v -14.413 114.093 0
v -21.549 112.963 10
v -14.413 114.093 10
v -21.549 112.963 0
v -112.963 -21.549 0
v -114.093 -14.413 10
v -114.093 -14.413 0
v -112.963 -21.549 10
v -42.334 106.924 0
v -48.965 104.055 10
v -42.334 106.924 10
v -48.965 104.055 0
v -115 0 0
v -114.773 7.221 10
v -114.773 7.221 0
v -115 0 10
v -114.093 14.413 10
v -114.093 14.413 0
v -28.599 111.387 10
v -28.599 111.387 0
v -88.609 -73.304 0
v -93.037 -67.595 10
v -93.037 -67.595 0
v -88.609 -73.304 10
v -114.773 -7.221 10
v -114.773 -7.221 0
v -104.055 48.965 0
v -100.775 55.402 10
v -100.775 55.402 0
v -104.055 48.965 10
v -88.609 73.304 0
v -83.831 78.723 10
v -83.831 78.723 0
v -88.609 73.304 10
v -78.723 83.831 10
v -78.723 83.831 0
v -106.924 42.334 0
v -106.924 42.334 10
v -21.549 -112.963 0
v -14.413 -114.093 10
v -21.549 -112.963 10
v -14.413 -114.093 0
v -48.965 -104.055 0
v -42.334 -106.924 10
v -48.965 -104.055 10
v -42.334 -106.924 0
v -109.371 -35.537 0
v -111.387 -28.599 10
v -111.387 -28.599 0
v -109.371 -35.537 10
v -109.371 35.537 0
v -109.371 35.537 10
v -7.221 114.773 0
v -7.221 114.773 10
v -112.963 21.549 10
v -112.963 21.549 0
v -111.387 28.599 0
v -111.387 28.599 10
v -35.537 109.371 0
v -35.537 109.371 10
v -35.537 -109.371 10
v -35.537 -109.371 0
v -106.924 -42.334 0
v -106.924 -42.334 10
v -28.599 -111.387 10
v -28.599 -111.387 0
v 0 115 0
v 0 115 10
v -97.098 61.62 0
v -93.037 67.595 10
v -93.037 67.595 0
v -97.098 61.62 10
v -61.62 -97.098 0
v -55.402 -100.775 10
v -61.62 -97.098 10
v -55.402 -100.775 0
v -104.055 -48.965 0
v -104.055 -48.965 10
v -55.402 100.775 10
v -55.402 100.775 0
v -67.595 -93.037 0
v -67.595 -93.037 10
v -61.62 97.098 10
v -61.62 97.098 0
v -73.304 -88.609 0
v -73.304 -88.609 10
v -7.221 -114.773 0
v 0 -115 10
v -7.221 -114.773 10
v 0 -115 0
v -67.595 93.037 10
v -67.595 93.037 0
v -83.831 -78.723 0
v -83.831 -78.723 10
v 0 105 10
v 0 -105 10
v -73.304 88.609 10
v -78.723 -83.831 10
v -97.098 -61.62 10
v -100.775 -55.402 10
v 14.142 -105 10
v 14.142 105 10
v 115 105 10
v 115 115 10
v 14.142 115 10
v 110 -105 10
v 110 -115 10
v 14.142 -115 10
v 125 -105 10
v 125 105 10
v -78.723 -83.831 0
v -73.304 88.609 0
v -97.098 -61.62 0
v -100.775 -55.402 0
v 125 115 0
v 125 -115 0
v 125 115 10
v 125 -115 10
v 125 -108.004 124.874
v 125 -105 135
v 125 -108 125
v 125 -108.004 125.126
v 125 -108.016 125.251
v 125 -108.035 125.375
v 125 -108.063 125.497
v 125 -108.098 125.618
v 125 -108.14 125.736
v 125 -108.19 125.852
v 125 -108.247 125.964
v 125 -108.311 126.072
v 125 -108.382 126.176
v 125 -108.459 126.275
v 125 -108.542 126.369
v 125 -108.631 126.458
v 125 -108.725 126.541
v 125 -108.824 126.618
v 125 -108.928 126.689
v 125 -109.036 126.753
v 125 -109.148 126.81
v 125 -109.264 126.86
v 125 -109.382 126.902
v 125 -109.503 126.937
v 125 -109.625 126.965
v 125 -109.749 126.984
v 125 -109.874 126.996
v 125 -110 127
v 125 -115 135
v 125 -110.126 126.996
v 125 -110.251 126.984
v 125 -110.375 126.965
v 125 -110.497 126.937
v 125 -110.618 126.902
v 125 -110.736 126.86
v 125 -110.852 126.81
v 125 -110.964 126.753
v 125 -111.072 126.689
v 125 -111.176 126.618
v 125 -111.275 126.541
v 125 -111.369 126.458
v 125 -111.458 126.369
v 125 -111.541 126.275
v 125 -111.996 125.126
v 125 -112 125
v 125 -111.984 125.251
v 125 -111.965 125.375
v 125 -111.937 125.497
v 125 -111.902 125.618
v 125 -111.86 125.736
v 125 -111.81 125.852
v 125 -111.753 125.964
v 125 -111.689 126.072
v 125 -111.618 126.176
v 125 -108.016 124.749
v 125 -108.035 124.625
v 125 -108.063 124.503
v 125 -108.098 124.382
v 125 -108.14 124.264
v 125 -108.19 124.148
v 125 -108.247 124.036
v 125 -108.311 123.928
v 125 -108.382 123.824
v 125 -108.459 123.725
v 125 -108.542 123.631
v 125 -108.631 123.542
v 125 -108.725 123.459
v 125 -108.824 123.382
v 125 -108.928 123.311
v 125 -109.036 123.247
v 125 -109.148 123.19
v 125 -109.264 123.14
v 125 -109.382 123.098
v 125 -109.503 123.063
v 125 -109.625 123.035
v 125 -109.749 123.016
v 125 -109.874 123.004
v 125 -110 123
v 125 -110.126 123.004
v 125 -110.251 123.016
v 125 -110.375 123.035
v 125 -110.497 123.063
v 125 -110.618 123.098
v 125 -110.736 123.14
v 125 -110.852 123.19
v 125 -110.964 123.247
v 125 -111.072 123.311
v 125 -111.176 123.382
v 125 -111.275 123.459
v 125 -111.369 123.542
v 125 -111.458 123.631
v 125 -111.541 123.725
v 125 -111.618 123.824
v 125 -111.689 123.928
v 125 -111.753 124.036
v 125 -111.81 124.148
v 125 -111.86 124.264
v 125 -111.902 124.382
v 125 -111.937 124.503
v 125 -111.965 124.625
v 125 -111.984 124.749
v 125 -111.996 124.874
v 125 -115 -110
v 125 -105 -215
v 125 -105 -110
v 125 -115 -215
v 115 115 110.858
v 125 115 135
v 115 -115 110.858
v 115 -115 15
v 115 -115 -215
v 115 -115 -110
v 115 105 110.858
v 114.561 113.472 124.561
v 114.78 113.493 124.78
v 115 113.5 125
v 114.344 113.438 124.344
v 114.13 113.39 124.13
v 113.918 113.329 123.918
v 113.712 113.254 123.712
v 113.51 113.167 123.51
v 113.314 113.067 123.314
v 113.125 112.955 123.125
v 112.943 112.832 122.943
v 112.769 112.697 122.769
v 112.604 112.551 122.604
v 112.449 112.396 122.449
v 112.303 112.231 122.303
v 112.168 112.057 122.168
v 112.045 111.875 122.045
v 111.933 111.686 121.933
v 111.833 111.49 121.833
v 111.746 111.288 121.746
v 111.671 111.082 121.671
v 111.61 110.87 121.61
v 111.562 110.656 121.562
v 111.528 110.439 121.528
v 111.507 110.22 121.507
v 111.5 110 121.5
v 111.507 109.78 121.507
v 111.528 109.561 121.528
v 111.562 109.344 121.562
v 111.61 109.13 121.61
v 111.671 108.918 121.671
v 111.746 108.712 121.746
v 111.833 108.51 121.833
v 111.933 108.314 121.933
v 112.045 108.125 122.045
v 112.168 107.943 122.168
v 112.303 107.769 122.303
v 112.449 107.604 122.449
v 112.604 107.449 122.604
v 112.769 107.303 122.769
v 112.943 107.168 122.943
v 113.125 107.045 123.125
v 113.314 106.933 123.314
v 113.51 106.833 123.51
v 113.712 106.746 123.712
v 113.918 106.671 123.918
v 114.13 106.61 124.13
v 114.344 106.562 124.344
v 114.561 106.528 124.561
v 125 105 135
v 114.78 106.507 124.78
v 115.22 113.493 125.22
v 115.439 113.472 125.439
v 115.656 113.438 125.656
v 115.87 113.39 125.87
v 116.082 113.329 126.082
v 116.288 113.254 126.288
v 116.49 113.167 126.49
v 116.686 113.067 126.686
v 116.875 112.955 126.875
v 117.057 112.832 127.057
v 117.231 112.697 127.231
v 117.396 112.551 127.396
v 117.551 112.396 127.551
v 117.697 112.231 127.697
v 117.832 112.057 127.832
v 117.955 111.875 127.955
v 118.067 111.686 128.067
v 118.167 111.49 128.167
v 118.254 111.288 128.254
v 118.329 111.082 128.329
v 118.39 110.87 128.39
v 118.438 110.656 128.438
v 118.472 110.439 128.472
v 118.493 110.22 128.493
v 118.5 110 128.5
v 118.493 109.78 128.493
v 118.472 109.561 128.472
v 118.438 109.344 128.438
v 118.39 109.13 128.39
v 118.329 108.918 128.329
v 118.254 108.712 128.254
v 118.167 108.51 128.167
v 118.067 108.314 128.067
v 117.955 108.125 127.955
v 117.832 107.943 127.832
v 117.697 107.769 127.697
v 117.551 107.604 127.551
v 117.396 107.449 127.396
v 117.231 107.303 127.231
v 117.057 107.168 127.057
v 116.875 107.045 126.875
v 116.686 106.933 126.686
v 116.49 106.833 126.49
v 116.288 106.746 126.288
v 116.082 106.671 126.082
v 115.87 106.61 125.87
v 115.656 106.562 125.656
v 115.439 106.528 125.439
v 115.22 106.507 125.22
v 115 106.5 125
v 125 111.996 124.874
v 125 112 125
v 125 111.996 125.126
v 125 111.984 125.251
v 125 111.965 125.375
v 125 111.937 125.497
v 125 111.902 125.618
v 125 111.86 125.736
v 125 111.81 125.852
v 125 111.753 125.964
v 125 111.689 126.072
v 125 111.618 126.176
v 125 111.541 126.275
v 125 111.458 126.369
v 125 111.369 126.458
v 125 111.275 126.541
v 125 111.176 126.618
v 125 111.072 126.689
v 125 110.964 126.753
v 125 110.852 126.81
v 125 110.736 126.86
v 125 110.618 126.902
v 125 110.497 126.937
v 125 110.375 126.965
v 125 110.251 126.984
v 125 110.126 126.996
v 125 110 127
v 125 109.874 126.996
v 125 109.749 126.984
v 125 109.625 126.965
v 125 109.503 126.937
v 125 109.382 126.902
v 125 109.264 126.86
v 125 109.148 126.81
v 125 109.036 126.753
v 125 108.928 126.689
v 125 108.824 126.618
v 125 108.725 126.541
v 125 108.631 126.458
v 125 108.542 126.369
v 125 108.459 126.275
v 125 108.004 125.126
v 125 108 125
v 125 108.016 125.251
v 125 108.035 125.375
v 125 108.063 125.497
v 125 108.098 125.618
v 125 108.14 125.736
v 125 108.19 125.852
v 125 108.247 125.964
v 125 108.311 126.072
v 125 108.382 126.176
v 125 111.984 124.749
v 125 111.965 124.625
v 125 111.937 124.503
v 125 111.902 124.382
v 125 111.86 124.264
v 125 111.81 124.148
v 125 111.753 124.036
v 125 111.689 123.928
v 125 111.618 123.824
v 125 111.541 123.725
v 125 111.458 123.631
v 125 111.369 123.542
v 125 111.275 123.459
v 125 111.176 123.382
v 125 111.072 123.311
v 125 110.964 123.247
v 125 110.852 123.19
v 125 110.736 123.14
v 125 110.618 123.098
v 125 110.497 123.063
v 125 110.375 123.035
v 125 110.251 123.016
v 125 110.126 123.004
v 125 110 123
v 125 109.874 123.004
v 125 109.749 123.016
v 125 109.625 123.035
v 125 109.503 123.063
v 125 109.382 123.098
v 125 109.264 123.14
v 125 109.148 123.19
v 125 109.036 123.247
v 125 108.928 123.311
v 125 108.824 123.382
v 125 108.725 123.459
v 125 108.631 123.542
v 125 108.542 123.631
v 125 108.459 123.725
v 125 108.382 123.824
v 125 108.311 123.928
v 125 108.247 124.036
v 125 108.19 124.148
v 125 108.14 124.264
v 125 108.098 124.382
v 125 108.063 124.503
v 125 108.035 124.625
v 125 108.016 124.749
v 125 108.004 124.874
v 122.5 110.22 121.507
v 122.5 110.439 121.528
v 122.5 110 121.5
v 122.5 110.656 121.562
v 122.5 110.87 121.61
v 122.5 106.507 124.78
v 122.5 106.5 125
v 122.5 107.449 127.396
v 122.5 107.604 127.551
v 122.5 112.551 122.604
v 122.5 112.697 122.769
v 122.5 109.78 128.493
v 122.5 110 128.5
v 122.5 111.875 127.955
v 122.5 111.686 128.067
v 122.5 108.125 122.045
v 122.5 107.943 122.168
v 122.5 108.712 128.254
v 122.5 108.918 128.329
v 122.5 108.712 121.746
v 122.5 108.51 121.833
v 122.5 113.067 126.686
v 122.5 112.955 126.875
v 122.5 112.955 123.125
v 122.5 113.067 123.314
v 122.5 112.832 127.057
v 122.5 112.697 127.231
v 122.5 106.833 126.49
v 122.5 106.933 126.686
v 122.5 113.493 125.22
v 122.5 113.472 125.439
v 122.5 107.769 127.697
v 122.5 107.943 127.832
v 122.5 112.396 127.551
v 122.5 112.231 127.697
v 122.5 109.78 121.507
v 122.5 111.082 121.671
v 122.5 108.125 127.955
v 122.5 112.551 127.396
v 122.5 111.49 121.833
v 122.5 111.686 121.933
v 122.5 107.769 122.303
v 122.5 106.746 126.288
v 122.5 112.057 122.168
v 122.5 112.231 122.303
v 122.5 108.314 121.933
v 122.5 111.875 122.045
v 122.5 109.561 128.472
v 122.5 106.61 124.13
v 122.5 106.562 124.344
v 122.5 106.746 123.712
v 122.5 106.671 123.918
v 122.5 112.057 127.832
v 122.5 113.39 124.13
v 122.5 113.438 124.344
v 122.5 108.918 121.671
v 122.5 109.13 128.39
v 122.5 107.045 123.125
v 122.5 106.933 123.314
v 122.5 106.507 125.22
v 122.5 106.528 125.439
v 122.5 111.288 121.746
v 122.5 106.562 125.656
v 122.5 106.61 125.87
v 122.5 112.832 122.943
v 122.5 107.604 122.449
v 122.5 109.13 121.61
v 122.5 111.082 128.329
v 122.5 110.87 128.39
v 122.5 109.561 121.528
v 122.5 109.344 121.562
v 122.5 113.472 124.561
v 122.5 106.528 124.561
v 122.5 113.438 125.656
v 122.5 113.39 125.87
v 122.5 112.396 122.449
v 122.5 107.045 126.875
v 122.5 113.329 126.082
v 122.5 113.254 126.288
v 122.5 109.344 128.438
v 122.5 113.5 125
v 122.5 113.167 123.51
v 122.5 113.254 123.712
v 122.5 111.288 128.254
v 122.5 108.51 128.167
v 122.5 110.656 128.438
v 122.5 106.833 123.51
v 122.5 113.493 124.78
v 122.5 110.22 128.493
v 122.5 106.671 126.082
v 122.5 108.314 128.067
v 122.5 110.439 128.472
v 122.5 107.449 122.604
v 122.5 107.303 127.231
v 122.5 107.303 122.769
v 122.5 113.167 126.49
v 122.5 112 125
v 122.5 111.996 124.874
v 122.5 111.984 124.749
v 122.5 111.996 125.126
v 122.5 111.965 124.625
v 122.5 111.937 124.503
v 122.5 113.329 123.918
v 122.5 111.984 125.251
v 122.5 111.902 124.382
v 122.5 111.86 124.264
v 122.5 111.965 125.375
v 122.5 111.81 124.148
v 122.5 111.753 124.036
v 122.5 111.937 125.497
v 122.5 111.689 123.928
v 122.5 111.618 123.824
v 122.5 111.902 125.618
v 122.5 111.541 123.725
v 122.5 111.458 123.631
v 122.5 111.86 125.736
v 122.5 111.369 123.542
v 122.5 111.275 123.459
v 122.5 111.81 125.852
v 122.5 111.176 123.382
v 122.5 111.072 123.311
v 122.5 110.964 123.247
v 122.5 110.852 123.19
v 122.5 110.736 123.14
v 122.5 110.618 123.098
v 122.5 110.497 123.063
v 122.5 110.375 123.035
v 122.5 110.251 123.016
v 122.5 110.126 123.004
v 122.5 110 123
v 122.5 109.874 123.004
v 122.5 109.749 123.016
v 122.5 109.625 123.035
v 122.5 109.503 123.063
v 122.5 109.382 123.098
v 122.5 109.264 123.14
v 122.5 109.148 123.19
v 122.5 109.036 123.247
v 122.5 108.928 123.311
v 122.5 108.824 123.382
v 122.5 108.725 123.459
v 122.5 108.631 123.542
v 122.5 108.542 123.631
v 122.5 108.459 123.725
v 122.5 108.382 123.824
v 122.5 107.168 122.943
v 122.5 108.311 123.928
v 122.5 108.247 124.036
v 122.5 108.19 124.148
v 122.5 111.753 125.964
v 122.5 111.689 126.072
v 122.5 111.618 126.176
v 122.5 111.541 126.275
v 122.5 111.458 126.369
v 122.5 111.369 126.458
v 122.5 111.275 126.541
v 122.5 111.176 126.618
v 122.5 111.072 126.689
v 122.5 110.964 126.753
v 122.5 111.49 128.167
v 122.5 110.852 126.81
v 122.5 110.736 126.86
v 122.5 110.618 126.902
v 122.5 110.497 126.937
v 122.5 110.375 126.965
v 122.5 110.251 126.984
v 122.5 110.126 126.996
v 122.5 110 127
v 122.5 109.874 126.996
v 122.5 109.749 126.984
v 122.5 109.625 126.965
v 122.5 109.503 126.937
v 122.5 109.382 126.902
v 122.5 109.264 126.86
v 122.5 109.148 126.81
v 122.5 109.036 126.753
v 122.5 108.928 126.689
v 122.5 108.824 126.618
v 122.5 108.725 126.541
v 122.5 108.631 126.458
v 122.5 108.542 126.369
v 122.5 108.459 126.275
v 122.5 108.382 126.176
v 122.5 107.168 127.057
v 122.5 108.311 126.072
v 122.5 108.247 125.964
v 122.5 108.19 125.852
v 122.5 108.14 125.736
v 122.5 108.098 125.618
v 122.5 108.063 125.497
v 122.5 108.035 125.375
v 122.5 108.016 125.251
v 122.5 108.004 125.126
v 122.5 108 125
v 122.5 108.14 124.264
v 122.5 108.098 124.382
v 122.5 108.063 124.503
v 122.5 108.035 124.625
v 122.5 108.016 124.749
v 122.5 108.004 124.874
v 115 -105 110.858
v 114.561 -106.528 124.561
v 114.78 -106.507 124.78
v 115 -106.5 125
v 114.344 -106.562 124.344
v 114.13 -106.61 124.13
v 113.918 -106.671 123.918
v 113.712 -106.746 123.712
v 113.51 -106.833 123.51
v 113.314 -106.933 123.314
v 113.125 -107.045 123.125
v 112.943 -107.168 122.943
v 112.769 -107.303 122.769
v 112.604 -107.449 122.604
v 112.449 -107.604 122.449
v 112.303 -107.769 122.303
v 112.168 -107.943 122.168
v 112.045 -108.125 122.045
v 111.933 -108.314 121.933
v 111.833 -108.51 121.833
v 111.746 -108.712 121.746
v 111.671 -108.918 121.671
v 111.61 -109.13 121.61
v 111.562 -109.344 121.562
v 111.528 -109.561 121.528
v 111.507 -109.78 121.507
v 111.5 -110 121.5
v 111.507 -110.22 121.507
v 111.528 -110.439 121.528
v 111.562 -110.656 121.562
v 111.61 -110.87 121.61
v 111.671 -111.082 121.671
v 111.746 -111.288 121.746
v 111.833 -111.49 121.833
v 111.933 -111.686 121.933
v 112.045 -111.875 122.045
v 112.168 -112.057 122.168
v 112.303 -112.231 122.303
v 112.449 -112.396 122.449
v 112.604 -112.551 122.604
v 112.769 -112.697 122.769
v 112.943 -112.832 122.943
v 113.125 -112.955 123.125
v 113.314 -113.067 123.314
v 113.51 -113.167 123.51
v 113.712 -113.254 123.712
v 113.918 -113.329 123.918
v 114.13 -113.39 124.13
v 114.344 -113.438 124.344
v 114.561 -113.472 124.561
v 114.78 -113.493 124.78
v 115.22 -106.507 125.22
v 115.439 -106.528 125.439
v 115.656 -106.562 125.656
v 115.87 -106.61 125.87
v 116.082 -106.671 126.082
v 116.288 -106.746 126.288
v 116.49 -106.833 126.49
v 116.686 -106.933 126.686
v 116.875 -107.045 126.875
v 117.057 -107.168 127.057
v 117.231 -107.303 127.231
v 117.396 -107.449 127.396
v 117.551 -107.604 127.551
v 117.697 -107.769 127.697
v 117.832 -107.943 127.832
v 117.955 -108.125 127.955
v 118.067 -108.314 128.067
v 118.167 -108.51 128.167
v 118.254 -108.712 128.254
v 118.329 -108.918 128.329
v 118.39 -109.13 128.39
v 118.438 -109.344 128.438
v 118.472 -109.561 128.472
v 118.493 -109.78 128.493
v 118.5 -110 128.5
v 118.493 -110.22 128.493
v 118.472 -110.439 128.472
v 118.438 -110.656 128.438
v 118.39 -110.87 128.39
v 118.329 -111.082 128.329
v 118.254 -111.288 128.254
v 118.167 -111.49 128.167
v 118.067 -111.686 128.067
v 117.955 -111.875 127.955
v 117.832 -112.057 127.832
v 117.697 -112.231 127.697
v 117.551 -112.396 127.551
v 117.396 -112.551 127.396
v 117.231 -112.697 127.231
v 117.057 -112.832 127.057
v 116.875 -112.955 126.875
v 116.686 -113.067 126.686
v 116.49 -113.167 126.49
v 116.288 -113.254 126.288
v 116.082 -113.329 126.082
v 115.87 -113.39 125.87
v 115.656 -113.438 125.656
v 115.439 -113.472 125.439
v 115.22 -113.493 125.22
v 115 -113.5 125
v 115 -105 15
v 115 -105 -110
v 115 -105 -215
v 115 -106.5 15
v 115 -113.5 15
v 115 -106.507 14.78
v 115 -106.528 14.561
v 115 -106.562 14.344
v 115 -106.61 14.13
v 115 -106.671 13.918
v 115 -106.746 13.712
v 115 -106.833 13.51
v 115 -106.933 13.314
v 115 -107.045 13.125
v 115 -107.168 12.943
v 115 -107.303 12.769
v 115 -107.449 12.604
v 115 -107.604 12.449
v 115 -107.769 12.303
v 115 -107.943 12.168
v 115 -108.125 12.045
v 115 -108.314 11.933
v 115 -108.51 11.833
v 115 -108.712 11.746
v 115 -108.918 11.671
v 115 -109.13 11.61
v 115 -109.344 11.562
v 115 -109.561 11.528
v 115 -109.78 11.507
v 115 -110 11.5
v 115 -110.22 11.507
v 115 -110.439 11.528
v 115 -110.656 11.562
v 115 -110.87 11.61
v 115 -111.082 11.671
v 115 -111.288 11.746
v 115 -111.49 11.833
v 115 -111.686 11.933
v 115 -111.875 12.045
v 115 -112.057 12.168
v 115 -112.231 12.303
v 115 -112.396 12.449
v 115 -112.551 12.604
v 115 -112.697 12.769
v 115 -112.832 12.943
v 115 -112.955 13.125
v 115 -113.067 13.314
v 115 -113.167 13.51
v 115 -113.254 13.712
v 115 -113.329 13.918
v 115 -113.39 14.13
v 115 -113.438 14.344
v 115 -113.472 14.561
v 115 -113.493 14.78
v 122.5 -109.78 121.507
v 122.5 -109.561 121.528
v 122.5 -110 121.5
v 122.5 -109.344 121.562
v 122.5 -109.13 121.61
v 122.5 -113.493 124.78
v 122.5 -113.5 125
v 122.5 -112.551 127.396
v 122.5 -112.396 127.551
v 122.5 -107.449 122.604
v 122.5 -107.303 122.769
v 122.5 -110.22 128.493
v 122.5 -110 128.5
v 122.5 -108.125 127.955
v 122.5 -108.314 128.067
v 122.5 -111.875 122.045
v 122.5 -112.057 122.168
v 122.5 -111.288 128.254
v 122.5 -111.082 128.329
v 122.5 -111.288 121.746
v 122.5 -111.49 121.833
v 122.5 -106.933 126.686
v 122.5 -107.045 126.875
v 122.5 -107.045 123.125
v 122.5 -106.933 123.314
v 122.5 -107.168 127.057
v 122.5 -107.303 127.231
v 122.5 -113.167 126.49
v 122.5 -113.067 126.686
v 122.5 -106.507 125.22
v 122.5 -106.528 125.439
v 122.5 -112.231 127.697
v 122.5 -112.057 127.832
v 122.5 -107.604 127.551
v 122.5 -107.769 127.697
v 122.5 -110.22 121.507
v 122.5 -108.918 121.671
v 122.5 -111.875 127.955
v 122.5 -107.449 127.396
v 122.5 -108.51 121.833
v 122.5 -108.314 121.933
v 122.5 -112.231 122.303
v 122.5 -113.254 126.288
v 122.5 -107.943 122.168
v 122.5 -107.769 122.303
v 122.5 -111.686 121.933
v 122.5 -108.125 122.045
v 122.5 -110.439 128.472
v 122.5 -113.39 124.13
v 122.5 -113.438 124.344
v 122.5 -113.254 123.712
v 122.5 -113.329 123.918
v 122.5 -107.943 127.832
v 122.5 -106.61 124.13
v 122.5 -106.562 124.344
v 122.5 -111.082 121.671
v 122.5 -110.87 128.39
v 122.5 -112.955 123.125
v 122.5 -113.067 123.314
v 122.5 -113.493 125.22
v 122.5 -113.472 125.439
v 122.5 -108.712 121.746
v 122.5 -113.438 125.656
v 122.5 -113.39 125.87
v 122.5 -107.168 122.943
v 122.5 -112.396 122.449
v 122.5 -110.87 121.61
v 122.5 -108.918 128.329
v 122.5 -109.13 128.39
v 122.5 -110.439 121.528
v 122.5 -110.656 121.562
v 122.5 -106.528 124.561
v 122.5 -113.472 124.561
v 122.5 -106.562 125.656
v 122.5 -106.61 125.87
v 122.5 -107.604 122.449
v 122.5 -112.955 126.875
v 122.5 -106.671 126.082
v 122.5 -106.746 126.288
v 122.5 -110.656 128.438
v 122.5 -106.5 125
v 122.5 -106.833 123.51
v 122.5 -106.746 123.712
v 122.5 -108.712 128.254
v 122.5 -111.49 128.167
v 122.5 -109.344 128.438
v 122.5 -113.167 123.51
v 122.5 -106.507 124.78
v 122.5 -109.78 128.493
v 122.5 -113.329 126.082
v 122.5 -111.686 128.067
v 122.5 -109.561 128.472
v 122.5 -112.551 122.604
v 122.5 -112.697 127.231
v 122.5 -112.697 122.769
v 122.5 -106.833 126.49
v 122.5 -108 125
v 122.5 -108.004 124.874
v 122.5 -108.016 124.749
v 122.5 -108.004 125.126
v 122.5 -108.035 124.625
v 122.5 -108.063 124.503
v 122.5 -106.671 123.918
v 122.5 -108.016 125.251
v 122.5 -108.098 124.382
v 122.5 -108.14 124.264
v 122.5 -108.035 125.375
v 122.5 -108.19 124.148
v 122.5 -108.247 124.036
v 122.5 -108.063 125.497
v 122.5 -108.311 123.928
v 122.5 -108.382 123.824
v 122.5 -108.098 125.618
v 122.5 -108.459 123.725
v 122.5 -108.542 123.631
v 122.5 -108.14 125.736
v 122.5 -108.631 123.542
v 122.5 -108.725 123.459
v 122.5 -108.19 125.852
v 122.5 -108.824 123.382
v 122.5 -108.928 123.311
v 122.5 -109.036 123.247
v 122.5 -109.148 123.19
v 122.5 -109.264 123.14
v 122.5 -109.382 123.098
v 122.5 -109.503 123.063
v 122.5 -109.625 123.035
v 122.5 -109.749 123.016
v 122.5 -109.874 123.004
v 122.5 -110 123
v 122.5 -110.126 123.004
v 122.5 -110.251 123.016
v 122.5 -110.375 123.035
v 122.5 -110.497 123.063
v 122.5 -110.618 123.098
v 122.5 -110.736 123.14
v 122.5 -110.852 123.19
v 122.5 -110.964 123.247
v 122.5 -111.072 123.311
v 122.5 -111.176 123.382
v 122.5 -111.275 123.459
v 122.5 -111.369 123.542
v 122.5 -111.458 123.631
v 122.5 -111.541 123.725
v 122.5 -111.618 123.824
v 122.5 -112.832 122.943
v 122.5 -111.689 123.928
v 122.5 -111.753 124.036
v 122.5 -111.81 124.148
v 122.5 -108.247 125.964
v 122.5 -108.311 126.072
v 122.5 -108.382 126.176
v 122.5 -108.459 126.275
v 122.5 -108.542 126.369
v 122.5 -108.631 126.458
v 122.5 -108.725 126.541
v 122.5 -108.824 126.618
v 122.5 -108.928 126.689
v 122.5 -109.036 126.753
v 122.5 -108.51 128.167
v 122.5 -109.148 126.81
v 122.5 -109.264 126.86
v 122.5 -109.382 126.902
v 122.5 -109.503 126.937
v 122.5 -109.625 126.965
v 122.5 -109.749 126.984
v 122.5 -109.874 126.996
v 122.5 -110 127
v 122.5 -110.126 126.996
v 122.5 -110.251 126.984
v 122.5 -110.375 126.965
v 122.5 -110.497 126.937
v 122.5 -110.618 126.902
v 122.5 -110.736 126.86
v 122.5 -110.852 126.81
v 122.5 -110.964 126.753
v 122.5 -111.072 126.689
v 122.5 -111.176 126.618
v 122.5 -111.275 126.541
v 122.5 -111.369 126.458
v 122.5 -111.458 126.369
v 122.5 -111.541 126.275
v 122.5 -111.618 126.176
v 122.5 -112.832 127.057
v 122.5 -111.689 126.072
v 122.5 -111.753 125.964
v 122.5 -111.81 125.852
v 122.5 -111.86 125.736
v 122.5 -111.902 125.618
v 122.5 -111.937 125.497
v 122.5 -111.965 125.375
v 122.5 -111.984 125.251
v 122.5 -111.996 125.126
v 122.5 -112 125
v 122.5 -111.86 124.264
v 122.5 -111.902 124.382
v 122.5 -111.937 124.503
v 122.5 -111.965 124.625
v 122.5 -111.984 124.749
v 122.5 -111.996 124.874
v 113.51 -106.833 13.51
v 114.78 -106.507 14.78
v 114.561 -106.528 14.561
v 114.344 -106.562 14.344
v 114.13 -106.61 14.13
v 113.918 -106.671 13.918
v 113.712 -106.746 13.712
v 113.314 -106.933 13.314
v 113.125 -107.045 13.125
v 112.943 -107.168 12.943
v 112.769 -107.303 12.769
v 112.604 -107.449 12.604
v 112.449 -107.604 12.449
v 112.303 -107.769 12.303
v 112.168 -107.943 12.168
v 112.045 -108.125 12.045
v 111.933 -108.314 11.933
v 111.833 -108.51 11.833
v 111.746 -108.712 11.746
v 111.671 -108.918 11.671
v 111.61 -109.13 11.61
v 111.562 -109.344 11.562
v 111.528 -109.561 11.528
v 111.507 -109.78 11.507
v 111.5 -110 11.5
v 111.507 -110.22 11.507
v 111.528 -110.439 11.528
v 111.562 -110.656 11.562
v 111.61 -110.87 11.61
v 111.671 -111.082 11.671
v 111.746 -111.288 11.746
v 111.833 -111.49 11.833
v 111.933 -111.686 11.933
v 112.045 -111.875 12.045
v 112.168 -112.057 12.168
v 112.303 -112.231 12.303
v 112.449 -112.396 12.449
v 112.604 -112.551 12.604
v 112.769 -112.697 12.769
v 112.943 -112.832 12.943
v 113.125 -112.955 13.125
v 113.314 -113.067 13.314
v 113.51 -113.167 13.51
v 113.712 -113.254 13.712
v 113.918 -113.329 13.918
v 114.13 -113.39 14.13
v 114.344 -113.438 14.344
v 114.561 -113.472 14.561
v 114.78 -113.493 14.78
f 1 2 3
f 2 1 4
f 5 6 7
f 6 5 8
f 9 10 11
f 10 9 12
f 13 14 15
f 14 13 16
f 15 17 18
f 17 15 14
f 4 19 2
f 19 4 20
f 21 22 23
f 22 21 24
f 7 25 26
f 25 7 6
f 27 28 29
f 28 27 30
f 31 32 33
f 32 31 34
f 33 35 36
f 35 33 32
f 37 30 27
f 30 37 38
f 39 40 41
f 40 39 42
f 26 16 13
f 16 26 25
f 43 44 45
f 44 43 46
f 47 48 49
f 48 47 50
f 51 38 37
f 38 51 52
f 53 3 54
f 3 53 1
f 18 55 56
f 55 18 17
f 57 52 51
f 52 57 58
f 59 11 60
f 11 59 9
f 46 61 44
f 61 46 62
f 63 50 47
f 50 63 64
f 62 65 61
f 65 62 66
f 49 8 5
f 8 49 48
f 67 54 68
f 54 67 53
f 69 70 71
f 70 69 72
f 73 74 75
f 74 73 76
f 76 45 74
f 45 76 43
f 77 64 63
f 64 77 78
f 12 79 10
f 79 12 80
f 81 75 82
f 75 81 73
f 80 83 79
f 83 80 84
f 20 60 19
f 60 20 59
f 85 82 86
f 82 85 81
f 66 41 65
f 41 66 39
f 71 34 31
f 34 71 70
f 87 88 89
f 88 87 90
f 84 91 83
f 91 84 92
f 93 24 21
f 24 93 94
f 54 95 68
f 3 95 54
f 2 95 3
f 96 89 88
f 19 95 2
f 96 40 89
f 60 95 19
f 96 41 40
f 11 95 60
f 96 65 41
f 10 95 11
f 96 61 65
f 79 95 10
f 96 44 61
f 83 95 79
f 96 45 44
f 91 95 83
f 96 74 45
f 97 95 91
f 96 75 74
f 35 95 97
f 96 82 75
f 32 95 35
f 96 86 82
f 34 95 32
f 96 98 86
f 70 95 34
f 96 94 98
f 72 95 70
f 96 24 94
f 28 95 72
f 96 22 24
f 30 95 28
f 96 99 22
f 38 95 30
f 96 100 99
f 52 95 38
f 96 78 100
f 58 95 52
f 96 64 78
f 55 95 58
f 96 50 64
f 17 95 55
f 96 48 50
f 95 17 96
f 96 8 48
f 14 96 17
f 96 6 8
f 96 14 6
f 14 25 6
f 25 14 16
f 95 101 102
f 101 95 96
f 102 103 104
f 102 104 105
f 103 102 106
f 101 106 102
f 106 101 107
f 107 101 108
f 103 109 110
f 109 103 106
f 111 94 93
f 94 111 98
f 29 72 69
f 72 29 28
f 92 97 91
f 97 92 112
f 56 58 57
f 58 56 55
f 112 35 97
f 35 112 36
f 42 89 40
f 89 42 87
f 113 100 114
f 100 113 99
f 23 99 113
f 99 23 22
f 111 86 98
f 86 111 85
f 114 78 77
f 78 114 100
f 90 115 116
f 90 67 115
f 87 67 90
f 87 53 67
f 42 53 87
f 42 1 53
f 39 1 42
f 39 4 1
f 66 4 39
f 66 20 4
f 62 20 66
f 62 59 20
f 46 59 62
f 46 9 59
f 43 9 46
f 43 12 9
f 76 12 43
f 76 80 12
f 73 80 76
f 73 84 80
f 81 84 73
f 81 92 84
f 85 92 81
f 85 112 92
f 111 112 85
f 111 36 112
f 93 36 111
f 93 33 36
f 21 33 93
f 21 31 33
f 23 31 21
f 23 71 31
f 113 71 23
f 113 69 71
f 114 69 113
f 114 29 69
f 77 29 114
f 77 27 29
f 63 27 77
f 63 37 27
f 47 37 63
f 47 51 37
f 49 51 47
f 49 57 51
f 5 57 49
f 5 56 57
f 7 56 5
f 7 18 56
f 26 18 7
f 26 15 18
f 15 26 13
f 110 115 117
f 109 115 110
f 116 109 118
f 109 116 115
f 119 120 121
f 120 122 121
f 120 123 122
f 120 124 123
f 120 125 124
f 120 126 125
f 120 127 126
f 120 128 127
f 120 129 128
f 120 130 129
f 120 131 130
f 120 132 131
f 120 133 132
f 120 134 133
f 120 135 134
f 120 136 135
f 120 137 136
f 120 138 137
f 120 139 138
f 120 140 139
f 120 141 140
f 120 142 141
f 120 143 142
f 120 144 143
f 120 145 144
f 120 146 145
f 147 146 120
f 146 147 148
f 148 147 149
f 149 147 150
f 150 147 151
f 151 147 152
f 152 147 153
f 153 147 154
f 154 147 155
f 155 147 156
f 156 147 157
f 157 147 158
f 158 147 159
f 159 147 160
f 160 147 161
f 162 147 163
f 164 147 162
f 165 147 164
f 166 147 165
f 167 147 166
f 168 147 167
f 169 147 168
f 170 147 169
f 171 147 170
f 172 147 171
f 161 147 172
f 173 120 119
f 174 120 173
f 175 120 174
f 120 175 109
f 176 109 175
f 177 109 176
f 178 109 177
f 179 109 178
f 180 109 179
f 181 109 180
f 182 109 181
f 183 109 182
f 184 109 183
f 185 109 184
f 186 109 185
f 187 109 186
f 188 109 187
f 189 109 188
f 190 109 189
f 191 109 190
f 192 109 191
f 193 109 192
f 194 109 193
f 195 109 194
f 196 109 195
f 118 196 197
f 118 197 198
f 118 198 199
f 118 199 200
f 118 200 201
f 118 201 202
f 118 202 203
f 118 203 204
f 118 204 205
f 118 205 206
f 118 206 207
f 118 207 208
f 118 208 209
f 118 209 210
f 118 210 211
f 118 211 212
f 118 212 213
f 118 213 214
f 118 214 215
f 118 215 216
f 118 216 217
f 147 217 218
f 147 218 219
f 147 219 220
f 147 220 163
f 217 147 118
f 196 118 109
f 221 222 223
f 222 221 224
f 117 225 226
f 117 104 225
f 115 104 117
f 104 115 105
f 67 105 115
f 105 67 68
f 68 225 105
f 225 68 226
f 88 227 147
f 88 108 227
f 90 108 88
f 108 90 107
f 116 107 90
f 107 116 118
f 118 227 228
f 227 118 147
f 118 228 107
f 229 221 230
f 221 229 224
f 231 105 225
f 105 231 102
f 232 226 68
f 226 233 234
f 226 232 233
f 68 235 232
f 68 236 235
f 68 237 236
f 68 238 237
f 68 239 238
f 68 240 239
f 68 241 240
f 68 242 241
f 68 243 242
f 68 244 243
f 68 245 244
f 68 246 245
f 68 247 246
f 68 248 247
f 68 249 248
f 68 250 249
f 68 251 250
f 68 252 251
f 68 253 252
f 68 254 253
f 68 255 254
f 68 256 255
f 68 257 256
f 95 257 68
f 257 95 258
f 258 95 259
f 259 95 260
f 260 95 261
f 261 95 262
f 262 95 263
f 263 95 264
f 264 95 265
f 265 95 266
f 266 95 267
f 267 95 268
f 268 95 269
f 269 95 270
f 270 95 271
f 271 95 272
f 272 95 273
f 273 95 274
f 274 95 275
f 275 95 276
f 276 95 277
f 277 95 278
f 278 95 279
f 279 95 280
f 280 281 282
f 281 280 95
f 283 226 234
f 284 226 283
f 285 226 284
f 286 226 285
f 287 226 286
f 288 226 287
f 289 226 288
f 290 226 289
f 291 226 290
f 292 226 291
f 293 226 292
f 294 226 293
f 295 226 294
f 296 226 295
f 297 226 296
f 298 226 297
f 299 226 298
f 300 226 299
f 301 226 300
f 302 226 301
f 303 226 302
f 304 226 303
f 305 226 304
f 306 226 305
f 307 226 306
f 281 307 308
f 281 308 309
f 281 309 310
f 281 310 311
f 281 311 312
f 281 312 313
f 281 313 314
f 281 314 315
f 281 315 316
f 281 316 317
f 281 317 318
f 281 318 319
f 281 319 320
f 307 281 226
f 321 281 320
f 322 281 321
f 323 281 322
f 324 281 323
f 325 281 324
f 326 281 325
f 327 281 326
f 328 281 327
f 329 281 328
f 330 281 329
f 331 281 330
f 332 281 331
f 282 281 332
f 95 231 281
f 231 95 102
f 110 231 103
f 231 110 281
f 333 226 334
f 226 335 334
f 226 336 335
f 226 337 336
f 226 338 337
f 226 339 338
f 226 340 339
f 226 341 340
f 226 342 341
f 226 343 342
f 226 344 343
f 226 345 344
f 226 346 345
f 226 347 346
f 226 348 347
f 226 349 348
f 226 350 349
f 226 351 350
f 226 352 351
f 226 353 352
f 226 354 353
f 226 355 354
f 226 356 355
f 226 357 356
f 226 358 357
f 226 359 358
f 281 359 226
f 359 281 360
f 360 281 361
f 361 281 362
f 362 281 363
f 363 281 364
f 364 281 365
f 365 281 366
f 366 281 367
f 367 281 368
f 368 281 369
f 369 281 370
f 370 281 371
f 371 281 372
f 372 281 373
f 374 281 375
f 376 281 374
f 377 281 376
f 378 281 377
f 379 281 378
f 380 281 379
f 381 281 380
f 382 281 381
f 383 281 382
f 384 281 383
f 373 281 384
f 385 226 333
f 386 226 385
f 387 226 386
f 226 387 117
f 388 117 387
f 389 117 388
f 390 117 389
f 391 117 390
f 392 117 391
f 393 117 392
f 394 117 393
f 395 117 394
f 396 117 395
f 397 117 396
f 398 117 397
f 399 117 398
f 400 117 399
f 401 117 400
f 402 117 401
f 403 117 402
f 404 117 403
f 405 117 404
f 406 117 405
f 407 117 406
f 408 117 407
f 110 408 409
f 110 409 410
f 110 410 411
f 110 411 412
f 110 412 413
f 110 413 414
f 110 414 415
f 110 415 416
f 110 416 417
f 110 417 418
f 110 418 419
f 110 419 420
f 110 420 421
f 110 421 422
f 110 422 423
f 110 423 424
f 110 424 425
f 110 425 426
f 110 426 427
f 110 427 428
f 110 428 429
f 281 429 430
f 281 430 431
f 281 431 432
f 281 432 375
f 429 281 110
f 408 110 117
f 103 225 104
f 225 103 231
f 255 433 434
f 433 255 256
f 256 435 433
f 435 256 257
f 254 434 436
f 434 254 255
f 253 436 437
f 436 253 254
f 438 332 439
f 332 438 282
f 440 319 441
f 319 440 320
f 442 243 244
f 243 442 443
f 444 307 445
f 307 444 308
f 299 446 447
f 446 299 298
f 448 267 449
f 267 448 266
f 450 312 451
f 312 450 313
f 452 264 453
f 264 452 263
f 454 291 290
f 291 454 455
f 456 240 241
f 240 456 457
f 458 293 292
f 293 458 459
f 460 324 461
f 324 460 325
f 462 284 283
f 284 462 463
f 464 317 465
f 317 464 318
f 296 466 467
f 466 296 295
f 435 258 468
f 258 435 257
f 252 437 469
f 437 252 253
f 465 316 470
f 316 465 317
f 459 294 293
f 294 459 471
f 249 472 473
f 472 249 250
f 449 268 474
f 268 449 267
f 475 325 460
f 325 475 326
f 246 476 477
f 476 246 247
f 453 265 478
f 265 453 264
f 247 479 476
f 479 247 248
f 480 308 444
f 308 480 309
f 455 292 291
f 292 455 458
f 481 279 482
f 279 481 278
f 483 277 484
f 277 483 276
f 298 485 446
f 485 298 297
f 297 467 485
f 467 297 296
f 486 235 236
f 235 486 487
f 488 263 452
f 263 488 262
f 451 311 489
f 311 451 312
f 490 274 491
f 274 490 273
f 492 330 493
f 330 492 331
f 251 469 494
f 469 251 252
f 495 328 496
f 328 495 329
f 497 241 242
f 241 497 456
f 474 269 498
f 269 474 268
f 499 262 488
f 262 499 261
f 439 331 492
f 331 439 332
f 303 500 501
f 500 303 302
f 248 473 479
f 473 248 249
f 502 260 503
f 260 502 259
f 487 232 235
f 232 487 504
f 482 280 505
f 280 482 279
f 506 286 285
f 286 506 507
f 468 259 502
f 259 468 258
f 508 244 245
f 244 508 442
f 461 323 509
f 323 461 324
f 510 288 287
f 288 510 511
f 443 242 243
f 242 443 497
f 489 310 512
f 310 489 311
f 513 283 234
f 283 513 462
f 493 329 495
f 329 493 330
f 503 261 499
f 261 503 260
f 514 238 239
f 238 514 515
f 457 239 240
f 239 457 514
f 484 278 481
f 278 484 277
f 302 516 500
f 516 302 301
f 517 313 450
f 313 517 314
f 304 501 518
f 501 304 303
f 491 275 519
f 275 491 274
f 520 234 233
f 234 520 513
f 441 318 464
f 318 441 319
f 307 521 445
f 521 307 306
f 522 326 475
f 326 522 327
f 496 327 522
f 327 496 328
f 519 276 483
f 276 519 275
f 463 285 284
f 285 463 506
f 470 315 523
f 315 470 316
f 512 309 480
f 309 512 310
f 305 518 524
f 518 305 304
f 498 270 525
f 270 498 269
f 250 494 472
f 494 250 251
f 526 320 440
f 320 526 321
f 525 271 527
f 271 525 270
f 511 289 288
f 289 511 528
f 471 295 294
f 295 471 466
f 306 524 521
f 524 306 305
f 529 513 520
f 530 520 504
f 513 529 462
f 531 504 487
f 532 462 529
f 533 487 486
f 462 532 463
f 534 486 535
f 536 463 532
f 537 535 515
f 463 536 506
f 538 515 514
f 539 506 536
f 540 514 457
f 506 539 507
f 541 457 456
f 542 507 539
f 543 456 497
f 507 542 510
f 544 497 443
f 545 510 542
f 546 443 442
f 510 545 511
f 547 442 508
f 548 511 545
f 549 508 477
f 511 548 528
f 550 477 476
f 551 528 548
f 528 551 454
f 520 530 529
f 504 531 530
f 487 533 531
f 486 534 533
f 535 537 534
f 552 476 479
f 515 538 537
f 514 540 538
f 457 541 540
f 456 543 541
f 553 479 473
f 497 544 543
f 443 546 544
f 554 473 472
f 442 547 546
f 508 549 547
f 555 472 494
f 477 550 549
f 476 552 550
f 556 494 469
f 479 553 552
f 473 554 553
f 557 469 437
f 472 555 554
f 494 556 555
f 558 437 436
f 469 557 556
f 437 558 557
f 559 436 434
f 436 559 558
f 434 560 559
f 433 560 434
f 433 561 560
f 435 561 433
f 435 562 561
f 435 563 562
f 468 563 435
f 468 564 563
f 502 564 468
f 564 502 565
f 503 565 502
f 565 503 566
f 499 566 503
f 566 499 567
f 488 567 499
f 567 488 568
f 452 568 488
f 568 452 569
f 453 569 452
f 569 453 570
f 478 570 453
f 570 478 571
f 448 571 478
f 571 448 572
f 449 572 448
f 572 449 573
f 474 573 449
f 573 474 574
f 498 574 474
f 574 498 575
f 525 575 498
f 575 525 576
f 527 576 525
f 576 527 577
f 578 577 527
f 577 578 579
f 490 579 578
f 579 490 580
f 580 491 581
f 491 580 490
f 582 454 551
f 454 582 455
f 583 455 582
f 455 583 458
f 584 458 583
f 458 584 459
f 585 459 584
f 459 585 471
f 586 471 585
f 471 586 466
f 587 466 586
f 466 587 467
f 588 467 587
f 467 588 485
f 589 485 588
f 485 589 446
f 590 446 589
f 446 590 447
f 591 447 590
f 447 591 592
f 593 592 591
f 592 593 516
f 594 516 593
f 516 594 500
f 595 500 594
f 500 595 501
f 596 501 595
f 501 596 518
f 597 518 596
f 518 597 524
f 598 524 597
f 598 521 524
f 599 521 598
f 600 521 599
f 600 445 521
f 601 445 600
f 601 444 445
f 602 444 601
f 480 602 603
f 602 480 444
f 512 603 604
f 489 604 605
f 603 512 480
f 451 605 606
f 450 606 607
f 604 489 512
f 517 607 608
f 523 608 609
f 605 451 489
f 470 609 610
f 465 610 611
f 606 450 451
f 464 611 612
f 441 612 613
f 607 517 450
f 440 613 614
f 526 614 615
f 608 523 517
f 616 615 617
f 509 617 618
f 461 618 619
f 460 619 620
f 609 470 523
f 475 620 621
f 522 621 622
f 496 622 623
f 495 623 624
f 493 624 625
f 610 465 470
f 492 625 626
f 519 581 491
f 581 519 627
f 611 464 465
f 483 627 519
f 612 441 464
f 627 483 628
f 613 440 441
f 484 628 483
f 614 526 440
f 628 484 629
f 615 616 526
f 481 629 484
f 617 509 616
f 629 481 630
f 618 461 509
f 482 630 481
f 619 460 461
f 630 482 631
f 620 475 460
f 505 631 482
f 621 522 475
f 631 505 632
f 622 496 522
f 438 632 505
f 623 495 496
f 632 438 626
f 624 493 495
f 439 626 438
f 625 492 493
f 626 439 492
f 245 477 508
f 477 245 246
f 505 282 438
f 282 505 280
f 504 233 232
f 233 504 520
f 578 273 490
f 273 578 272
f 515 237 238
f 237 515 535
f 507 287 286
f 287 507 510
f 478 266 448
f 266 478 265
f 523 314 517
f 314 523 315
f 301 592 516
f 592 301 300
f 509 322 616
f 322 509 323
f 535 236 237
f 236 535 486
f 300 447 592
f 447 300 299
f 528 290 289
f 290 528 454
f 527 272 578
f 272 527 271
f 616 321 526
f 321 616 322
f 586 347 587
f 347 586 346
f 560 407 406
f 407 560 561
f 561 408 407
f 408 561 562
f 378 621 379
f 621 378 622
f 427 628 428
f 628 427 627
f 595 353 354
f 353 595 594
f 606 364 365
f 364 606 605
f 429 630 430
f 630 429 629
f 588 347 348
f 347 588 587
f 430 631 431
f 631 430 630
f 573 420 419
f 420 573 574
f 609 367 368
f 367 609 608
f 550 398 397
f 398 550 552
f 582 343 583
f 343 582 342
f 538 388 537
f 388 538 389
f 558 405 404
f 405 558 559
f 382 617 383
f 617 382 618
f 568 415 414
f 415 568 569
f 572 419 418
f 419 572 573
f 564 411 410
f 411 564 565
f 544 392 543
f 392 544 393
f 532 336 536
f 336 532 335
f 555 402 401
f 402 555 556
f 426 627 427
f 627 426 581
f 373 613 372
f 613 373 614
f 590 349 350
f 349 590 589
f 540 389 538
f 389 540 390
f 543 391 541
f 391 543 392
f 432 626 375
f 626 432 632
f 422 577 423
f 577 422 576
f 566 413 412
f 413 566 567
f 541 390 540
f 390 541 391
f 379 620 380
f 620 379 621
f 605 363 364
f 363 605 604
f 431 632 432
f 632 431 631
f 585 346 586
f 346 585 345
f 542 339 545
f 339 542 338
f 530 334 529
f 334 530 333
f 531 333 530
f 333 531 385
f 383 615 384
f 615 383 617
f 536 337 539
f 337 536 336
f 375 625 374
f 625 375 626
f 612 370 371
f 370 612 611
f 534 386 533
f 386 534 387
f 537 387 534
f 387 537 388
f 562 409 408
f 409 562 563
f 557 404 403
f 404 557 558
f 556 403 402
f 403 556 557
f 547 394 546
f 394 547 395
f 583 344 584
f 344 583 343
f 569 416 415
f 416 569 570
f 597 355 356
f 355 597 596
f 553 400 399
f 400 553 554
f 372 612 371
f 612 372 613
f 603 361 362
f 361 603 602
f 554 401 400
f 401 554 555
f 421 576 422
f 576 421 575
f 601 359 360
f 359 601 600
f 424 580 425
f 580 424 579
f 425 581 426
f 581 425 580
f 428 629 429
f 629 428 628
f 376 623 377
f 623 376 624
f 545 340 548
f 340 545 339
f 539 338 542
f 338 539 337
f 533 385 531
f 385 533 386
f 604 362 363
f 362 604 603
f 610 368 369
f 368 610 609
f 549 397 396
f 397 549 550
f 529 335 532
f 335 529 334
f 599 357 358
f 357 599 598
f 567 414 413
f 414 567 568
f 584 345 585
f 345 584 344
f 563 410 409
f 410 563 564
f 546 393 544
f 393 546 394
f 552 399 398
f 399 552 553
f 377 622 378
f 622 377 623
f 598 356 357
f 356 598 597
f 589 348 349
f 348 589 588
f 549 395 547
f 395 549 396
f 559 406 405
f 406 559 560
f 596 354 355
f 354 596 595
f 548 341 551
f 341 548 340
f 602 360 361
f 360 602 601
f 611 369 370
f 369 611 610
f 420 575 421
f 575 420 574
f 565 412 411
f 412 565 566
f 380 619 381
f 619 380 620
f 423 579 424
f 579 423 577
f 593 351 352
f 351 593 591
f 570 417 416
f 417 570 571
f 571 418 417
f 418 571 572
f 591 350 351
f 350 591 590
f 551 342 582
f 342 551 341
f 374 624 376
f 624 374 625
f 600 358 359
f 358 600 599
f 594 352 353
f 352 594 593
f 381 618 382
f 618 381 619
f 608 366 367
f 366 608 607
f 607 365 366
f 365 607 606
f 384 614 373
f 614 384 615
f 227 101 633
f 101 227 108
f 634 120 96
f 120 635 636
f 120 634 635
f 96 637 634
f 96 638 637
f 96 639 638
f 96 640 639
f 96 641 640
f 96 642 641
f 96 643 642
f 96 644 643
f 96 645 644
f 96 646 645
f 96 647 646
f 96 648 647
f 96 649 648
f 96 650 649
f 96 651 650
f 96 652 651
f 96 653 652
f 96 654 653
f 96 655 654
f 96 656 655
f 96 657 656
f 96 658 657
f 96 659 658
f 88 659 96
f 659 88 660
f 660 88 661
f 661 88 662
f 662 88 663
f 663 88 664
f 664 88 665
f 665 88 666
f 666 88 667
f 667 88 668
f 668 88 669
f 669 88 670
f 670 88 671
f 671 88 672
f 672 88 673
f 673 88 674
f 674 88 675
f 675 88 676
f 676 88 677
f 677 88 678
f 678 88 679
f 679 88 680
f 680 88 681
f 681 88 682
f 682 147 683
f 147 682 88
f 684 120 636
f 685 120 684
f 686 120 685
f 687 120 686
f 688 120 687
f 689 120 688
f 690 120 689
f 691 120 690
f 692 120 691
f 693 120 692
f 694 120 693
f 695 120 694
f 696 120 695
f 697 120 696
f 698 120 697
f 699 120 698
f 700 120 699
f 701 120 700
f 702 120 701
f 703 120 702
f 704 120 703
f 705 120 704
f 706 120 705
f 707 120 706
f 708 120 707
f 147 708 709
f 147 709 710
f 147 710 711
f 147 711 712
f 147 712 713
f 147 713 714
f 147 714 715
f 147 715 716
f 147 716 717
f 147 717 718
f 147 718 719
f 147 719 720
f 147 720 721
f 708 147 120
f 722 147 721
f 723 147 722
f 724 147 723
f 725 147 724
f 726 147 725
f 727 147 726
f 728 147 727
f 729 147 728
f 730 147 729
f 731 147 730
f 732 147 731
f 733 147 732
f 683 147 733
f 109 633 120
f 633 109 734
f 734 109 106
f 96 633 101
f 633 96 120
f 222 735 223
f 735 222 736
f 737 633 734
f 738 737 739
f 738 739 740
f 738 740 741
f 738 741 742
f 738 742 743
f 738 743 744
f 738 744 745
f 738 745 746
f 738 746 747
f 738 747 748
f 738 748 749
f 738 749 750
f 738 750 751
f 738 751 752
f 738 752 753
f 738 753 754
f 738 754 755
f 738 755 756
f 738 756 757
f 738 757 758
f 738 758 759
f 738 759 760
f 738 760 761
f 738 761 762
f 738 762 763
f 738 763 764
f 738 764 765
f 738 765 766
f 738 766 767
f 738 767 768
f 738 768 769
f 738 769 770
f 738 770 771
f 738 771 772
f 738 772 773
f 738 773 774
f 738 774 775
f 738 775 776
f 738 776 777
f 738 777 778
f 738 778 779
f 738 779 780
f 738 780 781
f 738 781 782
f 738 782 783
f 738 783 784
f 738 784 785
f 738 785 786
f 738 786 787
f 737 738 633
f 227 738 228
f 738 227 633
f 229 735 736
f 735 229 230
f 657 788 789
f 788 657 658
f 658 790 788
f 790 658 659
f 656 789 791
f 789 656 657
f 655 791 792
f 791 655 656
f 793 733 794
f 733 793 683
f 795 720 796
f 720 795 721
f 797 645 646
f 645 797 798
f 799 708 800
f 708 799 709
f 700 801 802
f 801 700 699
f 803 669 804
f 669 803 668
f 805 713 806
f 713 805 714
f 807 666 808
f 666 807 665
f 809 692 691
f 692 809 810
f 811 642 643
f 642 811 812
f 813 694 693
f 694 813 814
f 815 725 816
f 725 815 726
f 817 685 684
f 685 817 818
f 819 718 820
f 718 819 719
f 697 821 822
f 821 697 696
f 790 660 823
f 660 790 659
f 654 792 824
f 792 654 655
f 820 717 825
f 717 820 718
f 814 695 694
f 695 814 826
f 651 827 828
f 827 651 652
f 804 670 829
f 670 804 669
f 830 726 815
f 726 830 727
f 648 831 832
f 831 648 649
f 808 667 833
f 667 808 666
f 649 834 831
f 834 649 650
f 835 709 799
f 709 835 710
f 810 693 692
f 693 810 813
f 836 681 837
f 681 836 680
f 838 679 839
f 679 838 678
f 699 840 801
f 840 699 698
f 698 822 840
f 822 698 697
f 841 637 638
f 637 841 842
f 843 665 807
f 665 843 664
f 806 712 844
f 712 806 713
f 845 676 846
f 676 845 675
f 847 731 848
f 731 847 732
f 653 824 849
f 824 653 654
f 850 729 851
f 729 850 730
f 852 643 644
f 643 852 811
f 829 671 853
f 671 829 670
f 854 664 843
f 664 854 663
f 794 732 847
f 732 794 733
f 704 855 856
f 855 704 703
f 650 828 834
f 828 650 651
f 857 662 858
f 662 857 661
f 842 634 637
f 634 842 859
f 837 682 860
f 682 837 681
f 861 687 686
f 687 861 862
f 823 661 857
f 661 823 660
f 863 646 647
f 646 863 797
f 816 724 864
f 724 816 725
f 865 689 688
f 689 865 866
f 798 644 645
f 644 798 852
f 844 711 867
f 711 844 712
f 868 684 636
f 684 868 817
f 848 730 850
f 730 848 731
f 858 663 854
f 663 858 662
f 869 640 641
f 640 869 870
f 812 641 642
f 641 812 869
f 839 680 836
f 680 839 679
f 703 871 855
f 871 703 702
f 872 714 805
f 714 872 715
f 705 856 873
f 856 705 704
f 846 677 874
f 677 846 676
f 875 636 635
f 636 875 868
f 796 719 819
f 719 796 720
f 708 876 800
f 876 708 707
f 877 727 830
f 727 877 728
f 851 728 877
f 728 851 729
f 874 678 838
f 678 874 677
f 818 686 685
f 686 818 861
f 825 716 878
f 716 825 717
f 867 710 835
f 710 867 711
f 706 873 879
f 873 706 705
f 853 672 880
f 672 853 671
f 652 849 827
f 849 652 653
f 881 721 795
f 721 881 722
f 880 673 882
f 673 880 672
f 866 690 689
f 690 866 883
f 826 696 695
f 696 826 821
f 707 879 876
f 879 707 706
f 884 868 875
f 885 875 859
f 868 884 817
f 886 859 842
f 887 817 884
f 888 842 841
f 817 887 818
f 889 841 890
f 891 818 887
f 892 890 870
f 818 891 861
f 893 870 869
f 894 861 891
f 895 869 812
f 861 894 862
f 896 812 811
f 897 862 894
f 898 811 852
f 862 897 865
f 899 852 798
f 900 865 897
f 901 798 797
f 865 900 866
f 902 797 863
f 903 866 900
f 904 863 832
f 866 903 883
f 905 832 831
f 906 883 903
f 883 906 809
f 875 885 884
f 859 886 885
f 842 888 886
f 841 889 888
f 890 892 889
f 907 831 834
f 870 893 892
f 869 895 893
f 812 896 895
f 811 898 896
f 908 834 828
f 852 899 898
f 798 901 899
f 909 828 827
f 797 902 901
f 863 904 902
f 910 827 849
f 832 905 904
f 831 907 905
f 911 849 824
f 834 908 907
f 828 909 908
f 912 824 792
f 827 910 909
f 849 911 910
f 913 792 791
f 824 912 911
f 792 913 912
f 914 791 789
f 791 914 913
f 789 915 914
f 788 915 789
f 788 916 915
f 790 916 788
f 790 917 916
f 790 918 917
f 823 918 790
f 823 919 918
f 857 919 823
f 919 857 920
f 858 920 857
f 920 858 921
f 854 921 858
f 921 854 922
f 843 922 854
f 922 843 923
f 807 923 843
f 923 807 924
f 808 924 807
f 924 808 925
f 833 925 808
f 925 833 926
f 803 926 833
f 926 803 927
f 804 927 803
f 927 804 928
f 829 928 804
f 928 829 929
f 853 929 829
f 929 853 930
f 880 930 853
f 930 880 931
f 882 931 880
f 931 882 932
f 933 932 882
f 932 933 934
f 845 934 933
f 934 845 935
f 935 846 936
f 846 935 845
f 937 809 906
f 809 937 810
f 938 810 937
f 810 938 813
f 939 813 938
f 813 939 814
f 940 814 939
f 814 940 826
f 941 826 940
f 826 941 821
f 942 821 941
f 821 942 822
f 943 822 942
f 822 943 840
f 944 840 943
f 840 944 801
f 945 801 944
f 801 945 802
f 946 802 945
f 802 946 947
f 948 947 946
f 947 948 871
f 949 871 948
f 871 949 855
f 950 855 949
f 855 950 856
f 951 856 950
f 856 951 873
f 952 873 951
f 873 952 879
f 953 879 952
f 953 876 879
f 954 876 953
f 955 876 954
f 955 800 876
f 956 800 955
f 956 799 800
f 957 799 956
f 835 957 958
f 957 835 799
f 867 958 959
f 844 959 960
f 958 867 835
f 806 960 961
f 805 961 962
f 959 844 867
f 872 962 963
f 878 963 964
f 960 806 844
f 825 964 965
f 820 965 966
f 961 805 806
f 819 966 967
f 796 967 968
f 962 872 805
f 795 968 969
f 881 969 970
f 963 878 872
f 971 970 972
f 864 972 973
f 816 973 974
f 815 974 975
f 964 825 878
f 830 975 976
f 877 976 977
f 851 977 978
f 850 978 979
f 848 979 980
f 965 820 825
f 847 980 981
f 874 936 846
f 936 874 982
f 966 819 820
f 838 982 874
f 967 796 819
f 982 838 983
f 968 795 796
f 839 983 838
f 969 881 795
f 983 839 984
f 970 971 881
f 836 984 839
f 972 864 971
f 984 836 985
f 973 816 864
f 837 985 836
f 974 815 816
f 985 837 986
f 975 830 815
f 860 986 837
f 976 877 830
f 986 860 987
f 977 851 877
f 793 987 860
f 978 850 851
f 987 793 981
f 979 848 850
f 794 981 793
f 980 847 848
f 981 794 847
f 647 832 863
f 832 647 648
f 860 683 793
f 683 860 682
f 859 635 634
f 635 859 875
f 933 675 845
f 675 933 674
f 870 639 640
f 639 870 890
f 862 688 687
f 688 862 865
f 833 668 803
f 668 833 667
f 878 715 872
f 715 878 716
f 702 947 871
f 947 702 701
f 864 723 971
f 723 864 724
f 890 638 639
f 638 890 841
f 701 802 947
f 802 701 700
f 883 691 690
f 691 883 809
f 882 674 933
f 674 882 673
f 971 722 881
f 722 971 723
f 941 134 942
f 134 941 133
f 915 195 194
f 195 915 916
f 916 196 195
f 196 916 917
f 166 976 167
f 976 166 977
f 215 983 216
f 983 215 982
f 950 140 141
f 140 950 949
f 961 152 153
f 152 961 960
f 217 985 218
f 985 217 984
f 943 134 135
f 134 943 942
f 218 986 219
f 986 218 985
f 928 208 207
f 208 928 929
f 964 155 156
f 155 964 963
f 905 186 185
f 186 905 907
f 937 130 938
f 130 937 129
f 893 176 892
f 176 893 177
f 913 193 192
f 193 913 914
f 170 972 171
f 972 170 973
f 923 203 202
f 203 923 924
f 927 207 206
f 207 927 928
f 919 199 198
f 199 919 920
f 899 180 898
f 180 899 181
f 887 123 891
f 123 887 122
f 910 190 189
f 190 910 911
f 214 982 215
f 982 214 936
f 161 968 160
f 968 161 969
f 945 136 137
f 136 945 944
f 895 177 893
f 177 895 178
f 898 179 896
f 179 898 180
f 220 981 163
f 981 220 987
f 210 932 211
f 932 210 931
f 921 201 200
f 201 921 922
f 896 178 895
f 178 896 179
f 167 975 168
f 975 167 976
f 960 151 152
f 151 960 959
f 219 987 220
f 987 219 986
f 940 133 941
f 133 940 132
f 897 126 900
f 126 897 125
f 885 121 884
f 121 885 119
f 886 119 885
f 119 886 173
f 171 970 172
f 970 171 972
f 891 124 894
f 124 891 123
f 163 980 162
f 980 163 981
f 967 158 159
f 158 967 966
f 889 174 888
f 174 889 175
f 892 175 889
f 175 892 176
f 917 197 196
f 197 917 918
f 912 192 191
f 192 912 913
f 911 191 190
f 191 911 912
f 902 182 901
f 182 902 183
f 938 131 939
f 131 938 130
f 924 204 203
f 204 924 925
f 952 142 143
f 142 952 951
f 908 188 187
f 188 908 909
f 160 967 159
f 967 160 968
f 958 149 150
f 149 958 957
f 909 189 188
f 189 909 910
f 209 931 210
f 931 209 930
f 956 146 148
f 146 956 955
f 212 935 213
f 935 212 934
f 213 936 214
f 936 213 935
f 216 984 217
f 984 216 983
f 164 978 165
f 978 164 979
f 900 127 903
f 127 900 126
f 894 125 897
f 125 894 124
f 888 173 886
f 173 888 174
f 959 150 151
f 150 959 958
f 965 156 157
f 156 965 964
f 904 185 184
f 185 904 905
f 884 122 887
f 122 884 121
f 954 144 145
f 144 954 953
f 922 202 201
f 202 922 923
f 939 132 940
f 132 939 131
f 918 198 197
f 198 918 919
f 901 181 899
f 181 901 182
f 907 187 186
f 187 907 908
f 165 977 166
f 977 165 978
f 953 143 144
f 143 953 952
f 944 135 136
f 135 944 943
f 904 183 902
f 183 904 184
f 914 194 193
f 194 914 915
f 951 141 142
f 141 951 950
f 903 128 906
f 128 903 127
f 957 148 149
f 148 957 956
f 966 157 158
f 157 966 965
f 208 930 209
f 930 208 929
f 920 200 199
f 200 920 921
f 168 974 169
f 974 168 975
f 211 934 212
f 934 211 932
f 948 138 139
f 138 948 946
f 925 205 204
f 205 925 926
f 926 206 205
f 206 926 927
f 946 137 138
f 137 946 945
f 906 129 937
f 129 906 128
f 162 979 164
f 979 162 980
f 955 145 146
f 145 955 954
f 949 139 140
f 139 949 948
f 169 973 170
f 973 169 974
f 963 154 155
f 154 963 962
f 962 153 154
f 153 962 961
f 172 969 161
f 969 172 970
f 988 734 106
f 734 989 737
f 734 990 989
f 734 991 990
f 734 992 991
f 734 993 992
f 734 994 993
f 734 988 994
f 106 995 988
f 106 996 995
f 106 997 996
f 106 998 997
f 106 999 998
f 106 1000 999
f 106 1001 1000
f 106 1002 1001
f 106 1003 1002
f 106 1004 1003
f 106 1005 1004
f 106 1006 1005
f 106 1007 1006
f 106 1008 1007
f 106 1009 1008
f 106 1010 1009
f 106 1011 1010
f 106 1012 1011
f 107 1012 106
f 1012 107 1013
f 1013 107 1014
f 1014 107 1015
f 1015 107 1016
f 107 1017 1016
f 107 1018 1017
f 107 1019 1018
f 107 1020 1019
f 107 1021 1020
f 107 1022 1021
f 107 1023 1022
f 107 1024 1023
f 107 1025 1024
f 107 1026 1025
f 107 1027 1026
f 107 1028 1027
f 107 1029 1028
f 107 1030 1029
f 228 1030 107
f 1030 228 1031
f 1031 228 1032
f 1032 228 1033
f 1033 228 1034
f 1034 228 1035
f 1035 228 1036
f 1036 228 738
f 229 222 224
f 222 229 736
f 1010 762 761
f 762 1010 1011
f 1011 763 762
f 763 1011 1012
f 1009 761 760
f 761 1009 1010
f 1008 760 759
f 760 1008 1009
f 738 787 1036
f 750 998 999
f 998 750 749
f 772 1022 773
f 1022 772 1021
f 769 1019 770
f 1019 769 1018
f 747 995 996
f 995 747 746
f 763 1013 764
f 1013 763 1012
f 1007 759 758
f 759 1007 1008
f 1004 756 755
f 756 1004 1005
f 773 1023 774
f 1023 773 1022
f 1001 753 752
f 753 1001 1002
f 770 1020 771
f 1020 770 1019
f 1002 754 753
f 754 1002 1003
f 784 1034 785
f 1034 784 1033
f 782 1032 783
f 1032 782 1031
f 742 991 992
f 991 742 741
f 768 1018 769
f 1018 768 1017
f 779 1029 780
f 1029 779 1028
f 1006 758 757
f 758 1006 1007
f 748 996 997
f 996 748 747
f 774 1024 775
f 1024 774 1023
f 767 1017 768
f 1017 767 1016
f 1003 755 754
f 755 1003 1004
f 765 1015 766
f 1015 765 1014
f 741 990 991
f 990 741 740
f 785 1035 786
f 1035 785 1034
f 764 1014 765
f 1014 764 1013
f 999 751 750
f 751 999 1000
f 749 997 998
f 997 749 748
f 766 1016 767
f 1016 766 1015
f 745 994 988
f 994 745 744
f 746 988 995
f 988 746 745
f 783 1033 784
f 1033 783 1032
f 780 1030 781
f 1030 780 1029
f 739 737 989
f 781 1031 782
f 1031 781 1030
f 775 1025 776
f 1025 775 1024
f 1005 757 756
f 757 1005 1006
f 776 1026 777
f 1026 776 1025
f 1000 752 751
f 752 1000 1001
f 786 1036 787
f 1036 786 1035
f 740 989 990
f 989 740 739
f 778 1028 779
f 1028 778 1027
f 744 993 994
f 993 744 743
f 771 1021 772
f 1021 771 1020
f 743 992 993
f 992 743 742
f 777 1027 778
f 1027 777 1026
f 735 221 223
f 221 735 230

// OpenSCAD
// file: ../lib/air-purifier-shelf-lib.scad
// BEGIN_DESCRIPTION
// A wall-mounted round shelf for the Levoit Core 200S air purifier
// (Amazon B08FJ678YK — 186mm dia × 312mm tall, ~2.5 kg).
//
// The shelf is a disk with two diagonal truss struts that brace it
// against a flat wall. Two screws per strut anchor it; the
// counterbored holes accept the screw head and a thru-pass for a
// #6 wood screw or M3.5 wall anchor.
//
// A 230mm shelf gives the purifier ~22mm of margin all around — enough
// for the rubberized base feet to sit fully on the plate without
// overhanging.
// END_DESCRIPTION

// BEGIN_PARAMS
// Outer diameter of the shelf plate, in mm.
// 230mm fits the Levoit Core 200S (186mm) with a 22mm margin.
// Increase for larger purifiers; check that your wall has space.
shelf_diameter = 230;

// Plate / truss material thickness, in mm.
// 10mm is rigid enough for ~3 kg loads in PLA when printed solid;
// drop to 8mm for PETG or to save filament.
shelf_thickness = 10;

// Screw head counterbore radius, in mm.
// 3.5mm fits a #6 pan-head wood screw or an M3.5 anchor.
screw_hole_radius = 3.5;

// Screw shank thru-hole radius, in mm.
// 2mm clears an M3 / #6 screw shank cleanly.
screw_hole_thru_radius = 2;
// END_PARAMS

// ============================================================
// Helper modules
// ============================================================

// Truss strut: a 45° diagonal beam plus a vertical back leg that
// presses against the wall. Two screw holes punch through the back
// leg — counterbored from the wall side, thru-hole all the way.
module strut() {
    difference() {
        union() {
            rotate([0, 45, 0])
                cube([shelf_thickness, shelf_thickness, shelf_diameter]);
            translate([shelf_diameter / 2, 0, -shelf_diameter / 2])
                cube([shelf_thickness, shelf_thickness, shelf_diameter]);
        }

        // Counterbore + thru-hole through the back leg
        translate([(shelf_diameter / 2) - shelf_thickness - (shelf_thickness / 4),
                   shelf_thickness / 2,
                   shelf_diameter / 2]) {
            rotate([0, 90, 0]) {
                cylinder(h = shelf_thickness * 2, r = screw_hole_radius);
                cylinder(h = shelf_thickness * 4, r = screw_hole_thru_radius);
            }
        }

        // Clip the strut to the back of the wall plane
        translate([(shelf_diameter / 2) + shelf_thickness, 0, 0])
            cube([shelf_diameter, shelf_diameter, shelf_diameter]);
    }
}

// The shelf plate plus the wall-side back plate that the struts attach to.
module base() {
    union() {
        linear_extrude(shelf_thickness)
            circle(shelf_diameter / 2);
        translate([0, -shelf_diameter / 2, 0])
            cube([(shelf_diameter / 2) + shelf_thickness,
                  shelf_diameter,
                  shelf_thickness]);
    }
}

// ============================================================
// Public modules
// ============================================================

// Complete shelf assembly: round plate + two diagonal struts + bottom
// support strut, with everything below the base plane trimmed.
module shelf() {
    difference() {
        union() {
            base();

            // Left truss (top of plate)
            translate([0, (shelf_diameter / 2) - shelf_thickness, shelf_thickness])
                strut();

            // Right truss (bottom of plate)
            translate([0, -(shelf_diameter / 2), shelf_thickness])
                strut();

            // Right-bottom support strut
            translate([0,
                       -(shelf_diameter / 2),
                       shelf_thickness / 2 + shelf_thickness - (shelf_diameter / 2)])
                strut();
        }

        // Trim everything below the base plane
        translate([0, 0, -shelf_thickness * 11])
            scale([1, 1, 11])
                base();
    }
}
// main file
include <../lib/air-purifier-shelf-lib.scad>;
$fn = 100;

// Single-color preview — the shelf is one part, printed in one filament.
color("#00eaff") shelf();
